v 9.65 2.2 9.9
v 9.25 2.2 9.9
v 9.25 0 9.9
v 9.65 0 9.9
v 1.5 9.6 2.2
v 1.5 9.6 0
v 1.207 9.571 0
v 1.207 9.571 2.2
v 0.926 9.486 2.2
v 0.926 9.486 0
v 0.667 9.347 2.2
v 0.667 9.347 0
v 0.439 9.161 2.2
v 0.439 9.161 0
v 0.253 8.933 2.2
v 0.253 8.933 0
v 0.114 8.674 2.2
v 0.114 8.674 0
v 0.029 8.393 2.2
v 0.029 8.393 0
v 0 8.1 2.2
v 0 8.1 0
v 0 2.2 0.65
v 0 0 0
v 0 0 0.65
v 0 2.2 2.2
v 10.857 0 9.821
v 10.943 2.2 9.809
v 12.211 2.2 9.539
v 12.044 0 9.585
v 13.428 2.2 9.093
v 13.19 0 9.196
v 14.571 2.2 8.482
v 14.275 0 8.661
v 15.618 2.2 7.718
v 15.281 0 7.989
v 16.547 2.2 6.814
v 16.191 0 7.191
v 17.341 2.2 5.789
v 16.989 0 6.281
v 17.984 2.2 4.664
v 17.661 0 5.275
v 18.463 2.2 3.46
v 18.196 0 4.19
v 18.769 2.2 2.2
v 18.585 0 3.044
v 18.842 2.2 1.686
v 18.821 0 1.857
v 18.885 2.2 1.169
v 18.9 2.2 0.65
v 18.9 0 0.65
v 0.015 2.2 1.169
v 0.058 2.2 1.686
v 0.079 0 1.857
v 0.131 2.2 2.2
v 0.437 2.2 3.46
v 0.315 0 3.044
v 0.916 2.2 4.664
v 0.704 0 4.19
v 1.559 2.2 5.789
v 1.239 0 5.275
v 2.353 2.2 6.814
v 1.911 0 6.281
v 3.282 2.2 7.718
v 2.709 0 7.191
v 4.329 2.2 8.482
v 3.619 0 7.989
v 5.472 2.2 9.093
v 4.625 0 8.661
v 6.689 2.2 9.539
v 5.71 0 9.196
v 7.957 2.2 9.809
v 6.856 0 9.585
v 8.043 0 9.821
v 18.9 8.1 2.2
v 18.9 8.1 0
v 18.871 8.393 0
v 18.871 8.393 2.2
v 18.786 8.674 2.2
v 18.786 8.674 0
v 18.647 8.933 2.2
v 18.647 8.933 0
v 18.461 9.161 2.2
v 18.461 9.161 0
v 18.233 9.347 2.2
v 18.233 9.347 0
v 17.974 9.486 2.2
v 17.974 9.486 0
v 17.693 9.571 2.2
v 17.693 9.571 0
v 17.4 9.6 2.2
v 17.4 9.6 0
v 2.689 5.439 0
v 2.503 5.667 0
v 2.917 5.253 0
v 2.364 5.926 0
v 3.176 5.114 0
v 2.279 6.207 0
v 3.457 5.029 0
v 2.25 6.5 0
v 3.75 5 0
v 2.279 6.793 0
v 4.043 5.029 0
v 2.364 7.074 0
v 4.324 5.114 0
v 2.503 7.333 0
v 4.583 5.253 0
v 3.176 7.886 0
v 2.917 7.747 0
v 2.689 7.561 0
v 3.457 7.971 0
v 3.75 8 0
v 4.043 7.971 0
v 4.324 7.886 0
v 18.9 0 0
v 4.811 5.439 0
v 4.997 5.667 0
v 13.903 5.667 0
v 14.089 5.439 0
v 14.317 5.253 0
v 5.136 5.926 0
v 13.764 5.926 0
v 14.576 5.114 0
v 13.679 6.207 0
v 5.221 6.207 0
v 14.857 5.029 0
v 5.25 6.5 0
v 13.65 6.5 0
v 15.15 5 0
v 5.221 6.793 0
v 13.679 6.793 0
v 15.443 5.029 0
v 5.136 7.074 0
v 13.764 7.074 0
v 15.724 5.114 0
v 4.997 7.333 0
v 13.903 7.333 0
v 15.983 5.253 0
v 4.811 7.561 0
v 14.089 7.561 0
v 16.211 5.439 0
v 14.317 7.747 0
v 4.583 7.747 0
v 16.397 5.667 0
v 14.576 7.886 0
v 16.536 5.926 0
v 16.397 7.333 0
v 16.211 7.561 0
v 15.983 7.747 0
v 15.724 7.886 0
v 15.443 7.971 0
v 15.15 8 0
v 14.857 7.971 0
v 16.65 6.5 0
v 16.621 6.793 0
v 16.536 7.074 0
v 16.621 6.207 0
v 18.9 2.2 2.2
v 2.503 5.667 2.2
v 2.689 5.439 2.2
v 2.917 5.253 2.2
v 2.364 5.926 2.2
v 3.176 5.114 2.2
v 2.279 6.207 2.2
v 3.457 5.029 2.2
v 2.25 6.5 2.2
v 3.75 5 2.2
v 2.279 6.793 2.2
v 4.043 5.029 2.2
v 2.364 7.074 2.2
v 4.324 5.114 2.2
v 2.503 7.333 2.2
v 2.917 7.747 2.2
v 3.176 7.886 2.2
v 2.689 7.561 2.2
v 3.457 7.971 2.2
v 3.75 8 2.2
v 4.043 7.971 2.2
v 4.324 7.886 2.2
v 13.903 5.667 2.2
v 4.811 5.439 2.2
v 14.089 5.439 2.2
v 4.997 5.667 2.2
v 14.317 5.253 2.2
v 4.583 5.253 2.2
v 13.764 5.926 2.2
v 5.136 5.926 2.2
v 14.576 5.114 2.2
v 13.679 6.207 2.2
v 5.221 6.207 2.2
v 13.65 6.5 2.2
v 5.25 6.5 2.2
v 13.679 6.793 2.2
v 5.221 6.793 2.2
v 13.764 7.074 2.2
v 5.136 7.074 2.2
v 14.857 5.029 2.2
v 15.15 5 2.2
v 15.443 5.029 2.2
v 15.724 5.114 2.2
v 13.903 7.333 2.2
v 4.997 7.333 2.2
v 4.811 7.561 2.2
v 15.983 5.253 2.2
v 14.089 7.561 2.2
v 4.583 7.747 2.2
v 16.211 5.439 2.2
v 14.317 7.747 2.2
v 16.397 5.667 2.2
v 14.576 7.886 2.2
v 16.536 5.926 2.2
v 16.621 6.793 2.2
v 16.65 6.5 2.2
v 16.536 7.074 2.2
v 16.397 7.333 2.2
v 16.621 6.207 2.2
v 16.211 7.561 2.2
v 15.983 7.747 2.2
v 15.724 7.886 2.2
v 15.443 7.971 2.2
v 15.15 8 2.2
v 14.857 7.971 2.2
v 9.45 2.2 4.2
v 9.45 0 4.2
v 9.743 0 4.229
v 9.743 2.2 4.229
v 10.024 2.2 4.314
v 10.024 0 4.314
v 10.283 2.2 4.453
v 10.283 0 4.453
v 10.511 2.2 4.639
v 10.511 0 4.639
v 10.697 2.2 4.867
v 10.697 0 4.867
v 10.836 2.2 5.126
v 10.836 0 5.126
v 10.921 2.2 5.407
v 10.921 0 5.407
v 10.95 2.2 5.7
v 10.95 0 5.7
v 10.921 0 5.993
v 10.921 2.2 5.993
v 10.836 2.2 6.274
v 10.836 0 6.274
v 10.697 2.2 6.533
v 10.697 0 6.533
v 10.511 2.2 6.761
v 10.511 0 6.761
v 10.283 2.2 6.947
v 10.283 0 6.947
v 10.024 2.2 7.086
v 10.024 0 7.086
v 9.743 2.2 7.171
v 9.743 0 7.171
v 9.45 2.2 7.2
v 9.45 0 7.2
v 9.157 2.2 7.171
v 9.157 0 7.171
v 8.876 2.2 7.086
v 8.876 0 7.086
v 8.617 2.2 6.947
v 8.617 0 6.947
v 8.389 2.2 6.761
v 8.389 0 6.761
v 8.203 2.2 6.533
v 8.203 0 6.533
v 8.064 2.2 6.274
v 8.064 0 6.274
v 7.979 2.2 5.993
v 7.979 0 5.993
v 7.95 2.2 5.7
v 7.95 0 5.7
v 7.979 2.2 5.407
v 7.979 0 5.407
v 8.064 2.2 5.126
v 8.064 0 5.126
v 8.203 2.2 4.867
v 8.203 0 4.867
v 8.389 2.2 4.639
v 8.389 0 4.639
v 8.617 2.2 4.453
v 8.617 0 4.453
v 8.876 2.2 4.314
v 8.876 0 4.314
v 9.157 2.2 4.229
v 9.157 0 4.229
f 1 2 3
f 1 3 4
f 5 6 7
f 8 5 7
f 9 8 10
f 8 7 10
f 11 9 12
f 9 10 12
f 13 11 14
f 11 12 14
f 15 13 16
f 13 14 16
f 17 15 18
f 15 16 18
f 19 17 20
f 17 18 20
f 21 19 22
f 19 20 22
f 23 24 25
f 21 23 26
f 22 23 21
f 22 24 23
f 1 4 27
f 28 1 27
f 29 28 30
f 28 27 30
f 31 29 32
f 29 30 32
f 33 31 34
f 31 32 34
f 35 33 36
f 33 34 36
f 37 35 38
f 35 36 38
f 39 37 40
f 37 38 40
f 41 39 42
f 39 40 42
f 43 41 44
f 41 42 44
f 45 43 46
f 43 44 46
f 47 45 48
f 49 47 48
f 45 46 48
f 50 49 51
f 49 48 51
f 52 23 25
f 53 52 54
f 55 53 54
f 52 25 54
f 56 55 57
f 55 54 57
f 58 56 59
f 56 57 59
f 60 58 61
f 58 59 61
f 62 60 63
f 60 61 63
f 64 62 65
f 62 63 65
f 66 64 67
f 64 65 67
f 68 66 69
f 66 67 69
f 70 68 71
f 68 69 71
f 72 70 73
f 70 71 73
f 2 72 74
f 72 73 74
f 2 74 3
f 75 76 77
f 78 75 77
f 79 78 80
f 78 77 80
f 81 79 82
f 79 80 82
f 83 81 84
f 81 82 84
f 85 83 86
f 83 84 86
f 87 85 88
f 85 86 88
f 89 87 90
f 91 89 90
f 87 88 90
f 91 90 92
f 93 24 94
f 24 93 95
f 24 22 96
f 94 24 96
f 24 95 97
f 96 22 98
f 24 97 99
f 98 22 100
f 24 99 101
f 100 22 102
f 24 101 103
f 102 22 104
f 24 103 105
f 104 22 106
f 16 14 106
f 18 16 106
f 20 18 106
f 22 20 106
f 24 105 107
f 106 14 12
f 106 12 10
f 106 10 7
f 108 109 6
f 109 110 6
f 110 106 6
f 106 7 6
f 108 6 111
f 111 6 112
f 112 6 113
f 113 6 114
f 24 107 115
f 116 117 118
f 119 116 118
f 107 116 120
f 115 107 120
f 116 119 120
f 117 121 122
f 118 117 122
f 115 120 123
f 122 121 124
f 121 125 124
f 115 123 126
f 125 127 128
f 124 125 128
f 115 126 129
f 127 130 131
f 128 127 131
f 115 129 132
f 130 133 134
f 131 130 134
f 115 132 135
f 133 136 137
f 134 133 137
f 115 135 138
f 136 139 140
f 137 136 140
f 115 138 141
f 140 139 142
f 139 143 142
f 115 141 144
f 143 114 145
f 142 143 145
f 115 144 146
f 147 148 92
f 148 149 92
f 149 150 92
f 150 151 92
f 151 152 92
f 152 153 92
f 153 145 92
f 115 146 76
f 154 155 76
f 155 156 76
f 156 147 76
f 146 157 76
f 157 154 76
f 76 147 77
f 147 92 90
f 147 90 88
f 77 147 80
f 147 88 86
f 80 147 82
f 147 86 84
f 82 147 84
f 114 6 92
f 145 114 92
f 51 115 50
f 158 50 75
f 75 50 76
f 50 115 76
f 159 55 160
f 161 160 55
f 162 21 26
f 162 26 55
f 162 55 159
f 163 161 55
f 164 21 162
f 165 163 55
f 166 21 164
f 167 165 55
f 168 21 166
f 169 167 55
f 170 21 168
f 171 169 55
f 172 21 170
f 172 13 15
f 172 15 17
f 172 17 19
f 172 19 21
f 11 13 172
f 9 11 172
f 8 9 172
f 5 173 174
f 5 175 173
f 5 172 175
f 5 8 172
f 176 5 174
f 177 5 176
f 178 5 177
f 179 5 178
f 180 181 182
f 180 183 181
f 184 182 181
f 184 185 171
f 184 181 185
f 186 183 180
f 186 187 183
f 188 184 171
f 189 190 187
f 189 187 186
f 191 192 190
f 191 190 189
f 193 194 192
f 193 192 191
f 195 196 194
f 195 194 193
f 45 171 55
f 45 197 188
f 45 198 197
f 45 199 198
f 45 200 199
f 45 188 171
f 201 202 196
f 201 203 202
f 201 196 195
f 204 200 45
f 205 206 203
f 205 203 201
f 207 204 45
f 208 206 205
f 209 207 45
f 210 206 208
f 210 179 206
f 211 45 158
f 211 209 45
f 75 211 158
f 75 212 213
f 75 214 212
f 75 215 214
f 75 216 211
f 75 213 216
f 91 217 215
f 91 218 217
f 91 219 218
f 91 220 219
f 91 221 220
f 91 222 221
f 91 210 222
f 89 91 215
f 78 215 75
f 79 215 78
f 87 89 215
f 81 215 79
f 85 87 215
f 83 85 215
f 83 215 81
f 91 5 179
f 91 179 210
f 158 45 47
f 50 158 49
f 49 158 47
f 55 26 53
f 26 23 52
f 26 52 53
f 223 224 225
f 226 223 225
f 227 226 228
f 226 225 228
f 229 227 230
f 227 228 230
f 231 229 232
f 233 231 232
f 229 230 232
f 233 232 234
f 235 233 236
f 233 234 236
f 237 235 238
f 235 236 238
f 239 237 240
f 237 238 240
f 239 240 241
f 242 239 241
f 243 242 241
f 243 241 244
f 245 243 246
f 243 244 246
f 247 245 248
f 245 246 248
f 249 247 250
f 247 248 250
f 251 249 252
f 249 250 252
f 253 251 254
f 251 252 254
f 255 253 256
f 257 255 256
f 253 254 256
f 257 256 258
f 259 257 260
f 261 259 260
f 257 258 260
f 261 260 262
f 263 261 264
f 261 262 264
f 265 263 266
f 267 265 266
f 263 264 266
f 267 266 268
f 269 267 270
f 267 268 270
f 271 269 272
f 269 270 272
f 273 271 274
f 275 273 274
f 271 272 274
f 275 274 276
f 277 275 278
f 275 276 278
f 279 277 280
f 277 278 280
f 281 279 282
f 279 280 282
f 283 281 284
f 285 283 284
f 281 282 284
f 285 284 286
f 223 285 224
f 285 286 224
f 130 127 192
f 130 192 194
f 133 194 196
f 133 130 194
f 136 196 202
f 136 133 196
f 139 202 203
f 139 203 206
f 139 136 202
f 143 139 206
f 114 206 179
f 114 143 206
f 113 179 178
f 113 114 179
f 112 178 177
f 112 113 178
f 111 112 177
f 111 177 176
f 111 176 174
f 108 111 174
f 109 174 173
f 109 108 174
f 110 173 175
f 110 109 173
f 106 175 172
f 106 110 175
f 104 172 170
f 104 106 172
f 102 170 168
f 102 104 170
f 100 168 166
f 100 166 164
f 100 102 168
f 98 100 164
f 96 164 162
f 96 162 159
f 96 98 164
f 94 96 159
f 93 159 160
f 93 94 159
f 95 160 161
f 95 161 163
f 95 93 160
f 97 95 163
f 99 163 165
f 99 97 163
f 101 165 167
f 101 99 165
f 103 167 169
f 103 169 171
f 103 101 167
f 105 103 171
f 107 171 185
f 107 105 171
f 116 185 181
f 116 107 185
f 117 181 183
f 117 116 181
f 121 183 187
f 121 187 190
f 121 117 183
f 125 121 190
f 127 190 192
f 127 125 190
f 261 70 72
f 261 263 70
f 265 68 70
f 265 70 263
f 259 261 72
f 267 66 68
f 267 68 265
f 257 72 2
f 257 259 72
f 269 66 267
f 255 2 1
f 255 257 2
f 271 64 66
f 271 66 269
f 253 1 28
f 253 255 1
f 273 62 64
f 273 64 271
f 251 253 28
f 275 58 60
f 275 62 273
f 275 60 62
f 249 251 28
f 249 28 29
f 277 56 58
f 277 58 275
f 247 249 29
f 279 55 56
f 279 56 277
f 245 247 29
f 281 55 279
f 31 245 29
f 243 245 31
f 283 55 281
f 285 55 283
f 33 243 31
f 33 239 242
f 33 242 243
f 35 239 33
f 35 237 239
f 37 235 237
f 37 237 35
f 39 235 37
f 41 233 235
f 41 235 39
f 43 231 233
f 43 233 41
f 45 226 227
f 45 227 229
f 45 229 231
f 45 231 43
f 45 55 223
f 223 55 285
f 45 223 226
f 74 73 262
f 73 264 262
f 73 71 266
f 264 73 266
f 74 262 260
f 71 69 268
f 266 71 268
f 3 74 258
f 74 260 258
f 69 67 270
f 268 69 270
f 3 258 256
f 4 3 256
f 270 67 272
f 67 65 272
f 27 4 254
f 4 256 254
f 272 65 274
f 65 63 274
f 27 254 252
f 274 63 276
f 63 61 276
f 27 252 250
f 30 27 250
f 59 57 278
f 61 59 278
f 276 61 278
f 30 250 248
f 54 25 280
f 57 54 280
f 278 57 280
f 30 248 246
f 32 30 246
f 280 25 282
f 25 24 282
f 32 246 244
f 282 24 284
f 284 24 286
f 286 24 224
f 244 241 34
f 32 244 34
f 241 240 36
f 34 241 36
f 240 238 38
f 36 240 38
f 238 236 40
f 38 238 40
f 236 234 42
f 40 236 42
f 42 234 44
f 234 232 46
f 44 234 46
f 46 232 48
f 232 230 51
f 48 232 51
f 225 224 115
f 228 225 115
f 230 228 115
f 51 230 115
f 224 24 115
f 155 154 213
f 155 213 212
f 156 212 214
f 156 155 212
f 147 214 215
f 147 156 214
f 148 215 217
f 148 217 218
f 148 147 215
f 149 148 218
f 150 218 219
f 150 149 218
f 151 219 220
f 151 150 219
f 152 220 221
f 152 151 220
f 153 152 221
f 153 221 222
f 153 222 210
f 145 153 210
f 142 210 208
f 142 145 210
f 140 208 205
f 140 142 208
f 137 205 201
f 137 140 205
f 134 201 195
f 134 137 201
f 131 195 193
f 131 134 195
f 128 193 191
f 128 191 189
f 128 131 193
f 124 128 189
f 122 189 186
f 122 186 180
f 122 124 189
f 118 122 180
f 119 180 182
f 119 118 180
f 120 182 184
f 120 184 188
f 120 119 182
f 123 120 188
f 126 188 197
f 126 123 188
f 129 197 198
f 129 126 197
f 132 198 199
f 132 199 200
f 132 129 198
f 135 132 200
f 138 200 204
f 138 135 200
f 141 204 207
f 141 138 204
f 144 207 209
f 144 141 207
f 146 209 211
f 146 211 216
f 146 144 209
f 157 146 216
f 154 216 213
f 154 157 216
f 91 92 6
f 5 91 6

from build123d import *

# Parameters (mm, degrees)
SKETCH1_R           = 1.5
BOSS_EXTRUDE1_DEPTH = 2.2
SKETCH2_W           = 18.9
SKETCH2_H           = 2.2
BOSS_EXTRUDE2_DEPTH = 7.7
SKETCH3_R           = 1.5
CUT_EXTRUDE1_DEPTH  = 2.2


with BuildPart() as part:
    # Sketch1 → Boss-Extrude1 (new body)
    with BuildSketch(Plane.XY):
        with BuildLine():
            Line((0, 0), (18.9, 0))
            Line((18.9, 0), (18.9, 8.1))
            ThreePointArc((18.9, 8.1), (18.460660172, 9.160660172), (17.4, 9.6))
            Line((17.4, 9.6), (1.5, 9.6))
            ThreePointArc((1.5, 9.6), (0.439339828, 9.160660172), (0, 8.1))
            Line((0, 8.1), (0, 0))
        make_face()
        with Locations((3.75, 6.5)):
            Circle(SKETCH1_R, mode=Mode.SUBTRACT)
        with Locations((15.15, 6.5)):
            Circle(SKETCH1_R, mode=Mode.SUBTRACT)
    extrude(amount=BOSS_EXTRUDE1_DEPTH)

    # Sketch2 → Boss-Extrude2 (add)
    with BuildSketch(Plane.XY.offset(2.2)):
        with Locations((9.45, 1.1)):
            Rectangle(SKETCH2_W, SKETCH2_H)
    extrude(amount=BOSS_EXTRUDE2_DEPTH)

    # Sketch3 → Cut-Extrude1 (cut)
    with BuildSketch(Plane.XZ):
        with BuildLine():
            Line((0, 9.9), (0, 0.65))
            ThreePointArc((0, 0.65), (2.709262274, 7.190737726), (9.25, 9.9))
            Line((9.25, 9.9), (0, 9.9))
        make_face()
        with BuildLine():
            Line((18.9, 9.9), (9.65, 9.9))
            ThreePointArc((9.65, 9.9), (16.190737726, 7.190737726), (18.9, 0.65))
            Line((18.9, 0.65), (18.9, 9.9))
        make_face()
        with Locations(Location((9.45, 5.7, 0), (0, 0, 270))):
            Circle(SKETCH3_R)
    extrude(amount=-CUT_EXTRUDE1_DEPTH, mode=Mode.SUBTRACT)


solid = part.part
